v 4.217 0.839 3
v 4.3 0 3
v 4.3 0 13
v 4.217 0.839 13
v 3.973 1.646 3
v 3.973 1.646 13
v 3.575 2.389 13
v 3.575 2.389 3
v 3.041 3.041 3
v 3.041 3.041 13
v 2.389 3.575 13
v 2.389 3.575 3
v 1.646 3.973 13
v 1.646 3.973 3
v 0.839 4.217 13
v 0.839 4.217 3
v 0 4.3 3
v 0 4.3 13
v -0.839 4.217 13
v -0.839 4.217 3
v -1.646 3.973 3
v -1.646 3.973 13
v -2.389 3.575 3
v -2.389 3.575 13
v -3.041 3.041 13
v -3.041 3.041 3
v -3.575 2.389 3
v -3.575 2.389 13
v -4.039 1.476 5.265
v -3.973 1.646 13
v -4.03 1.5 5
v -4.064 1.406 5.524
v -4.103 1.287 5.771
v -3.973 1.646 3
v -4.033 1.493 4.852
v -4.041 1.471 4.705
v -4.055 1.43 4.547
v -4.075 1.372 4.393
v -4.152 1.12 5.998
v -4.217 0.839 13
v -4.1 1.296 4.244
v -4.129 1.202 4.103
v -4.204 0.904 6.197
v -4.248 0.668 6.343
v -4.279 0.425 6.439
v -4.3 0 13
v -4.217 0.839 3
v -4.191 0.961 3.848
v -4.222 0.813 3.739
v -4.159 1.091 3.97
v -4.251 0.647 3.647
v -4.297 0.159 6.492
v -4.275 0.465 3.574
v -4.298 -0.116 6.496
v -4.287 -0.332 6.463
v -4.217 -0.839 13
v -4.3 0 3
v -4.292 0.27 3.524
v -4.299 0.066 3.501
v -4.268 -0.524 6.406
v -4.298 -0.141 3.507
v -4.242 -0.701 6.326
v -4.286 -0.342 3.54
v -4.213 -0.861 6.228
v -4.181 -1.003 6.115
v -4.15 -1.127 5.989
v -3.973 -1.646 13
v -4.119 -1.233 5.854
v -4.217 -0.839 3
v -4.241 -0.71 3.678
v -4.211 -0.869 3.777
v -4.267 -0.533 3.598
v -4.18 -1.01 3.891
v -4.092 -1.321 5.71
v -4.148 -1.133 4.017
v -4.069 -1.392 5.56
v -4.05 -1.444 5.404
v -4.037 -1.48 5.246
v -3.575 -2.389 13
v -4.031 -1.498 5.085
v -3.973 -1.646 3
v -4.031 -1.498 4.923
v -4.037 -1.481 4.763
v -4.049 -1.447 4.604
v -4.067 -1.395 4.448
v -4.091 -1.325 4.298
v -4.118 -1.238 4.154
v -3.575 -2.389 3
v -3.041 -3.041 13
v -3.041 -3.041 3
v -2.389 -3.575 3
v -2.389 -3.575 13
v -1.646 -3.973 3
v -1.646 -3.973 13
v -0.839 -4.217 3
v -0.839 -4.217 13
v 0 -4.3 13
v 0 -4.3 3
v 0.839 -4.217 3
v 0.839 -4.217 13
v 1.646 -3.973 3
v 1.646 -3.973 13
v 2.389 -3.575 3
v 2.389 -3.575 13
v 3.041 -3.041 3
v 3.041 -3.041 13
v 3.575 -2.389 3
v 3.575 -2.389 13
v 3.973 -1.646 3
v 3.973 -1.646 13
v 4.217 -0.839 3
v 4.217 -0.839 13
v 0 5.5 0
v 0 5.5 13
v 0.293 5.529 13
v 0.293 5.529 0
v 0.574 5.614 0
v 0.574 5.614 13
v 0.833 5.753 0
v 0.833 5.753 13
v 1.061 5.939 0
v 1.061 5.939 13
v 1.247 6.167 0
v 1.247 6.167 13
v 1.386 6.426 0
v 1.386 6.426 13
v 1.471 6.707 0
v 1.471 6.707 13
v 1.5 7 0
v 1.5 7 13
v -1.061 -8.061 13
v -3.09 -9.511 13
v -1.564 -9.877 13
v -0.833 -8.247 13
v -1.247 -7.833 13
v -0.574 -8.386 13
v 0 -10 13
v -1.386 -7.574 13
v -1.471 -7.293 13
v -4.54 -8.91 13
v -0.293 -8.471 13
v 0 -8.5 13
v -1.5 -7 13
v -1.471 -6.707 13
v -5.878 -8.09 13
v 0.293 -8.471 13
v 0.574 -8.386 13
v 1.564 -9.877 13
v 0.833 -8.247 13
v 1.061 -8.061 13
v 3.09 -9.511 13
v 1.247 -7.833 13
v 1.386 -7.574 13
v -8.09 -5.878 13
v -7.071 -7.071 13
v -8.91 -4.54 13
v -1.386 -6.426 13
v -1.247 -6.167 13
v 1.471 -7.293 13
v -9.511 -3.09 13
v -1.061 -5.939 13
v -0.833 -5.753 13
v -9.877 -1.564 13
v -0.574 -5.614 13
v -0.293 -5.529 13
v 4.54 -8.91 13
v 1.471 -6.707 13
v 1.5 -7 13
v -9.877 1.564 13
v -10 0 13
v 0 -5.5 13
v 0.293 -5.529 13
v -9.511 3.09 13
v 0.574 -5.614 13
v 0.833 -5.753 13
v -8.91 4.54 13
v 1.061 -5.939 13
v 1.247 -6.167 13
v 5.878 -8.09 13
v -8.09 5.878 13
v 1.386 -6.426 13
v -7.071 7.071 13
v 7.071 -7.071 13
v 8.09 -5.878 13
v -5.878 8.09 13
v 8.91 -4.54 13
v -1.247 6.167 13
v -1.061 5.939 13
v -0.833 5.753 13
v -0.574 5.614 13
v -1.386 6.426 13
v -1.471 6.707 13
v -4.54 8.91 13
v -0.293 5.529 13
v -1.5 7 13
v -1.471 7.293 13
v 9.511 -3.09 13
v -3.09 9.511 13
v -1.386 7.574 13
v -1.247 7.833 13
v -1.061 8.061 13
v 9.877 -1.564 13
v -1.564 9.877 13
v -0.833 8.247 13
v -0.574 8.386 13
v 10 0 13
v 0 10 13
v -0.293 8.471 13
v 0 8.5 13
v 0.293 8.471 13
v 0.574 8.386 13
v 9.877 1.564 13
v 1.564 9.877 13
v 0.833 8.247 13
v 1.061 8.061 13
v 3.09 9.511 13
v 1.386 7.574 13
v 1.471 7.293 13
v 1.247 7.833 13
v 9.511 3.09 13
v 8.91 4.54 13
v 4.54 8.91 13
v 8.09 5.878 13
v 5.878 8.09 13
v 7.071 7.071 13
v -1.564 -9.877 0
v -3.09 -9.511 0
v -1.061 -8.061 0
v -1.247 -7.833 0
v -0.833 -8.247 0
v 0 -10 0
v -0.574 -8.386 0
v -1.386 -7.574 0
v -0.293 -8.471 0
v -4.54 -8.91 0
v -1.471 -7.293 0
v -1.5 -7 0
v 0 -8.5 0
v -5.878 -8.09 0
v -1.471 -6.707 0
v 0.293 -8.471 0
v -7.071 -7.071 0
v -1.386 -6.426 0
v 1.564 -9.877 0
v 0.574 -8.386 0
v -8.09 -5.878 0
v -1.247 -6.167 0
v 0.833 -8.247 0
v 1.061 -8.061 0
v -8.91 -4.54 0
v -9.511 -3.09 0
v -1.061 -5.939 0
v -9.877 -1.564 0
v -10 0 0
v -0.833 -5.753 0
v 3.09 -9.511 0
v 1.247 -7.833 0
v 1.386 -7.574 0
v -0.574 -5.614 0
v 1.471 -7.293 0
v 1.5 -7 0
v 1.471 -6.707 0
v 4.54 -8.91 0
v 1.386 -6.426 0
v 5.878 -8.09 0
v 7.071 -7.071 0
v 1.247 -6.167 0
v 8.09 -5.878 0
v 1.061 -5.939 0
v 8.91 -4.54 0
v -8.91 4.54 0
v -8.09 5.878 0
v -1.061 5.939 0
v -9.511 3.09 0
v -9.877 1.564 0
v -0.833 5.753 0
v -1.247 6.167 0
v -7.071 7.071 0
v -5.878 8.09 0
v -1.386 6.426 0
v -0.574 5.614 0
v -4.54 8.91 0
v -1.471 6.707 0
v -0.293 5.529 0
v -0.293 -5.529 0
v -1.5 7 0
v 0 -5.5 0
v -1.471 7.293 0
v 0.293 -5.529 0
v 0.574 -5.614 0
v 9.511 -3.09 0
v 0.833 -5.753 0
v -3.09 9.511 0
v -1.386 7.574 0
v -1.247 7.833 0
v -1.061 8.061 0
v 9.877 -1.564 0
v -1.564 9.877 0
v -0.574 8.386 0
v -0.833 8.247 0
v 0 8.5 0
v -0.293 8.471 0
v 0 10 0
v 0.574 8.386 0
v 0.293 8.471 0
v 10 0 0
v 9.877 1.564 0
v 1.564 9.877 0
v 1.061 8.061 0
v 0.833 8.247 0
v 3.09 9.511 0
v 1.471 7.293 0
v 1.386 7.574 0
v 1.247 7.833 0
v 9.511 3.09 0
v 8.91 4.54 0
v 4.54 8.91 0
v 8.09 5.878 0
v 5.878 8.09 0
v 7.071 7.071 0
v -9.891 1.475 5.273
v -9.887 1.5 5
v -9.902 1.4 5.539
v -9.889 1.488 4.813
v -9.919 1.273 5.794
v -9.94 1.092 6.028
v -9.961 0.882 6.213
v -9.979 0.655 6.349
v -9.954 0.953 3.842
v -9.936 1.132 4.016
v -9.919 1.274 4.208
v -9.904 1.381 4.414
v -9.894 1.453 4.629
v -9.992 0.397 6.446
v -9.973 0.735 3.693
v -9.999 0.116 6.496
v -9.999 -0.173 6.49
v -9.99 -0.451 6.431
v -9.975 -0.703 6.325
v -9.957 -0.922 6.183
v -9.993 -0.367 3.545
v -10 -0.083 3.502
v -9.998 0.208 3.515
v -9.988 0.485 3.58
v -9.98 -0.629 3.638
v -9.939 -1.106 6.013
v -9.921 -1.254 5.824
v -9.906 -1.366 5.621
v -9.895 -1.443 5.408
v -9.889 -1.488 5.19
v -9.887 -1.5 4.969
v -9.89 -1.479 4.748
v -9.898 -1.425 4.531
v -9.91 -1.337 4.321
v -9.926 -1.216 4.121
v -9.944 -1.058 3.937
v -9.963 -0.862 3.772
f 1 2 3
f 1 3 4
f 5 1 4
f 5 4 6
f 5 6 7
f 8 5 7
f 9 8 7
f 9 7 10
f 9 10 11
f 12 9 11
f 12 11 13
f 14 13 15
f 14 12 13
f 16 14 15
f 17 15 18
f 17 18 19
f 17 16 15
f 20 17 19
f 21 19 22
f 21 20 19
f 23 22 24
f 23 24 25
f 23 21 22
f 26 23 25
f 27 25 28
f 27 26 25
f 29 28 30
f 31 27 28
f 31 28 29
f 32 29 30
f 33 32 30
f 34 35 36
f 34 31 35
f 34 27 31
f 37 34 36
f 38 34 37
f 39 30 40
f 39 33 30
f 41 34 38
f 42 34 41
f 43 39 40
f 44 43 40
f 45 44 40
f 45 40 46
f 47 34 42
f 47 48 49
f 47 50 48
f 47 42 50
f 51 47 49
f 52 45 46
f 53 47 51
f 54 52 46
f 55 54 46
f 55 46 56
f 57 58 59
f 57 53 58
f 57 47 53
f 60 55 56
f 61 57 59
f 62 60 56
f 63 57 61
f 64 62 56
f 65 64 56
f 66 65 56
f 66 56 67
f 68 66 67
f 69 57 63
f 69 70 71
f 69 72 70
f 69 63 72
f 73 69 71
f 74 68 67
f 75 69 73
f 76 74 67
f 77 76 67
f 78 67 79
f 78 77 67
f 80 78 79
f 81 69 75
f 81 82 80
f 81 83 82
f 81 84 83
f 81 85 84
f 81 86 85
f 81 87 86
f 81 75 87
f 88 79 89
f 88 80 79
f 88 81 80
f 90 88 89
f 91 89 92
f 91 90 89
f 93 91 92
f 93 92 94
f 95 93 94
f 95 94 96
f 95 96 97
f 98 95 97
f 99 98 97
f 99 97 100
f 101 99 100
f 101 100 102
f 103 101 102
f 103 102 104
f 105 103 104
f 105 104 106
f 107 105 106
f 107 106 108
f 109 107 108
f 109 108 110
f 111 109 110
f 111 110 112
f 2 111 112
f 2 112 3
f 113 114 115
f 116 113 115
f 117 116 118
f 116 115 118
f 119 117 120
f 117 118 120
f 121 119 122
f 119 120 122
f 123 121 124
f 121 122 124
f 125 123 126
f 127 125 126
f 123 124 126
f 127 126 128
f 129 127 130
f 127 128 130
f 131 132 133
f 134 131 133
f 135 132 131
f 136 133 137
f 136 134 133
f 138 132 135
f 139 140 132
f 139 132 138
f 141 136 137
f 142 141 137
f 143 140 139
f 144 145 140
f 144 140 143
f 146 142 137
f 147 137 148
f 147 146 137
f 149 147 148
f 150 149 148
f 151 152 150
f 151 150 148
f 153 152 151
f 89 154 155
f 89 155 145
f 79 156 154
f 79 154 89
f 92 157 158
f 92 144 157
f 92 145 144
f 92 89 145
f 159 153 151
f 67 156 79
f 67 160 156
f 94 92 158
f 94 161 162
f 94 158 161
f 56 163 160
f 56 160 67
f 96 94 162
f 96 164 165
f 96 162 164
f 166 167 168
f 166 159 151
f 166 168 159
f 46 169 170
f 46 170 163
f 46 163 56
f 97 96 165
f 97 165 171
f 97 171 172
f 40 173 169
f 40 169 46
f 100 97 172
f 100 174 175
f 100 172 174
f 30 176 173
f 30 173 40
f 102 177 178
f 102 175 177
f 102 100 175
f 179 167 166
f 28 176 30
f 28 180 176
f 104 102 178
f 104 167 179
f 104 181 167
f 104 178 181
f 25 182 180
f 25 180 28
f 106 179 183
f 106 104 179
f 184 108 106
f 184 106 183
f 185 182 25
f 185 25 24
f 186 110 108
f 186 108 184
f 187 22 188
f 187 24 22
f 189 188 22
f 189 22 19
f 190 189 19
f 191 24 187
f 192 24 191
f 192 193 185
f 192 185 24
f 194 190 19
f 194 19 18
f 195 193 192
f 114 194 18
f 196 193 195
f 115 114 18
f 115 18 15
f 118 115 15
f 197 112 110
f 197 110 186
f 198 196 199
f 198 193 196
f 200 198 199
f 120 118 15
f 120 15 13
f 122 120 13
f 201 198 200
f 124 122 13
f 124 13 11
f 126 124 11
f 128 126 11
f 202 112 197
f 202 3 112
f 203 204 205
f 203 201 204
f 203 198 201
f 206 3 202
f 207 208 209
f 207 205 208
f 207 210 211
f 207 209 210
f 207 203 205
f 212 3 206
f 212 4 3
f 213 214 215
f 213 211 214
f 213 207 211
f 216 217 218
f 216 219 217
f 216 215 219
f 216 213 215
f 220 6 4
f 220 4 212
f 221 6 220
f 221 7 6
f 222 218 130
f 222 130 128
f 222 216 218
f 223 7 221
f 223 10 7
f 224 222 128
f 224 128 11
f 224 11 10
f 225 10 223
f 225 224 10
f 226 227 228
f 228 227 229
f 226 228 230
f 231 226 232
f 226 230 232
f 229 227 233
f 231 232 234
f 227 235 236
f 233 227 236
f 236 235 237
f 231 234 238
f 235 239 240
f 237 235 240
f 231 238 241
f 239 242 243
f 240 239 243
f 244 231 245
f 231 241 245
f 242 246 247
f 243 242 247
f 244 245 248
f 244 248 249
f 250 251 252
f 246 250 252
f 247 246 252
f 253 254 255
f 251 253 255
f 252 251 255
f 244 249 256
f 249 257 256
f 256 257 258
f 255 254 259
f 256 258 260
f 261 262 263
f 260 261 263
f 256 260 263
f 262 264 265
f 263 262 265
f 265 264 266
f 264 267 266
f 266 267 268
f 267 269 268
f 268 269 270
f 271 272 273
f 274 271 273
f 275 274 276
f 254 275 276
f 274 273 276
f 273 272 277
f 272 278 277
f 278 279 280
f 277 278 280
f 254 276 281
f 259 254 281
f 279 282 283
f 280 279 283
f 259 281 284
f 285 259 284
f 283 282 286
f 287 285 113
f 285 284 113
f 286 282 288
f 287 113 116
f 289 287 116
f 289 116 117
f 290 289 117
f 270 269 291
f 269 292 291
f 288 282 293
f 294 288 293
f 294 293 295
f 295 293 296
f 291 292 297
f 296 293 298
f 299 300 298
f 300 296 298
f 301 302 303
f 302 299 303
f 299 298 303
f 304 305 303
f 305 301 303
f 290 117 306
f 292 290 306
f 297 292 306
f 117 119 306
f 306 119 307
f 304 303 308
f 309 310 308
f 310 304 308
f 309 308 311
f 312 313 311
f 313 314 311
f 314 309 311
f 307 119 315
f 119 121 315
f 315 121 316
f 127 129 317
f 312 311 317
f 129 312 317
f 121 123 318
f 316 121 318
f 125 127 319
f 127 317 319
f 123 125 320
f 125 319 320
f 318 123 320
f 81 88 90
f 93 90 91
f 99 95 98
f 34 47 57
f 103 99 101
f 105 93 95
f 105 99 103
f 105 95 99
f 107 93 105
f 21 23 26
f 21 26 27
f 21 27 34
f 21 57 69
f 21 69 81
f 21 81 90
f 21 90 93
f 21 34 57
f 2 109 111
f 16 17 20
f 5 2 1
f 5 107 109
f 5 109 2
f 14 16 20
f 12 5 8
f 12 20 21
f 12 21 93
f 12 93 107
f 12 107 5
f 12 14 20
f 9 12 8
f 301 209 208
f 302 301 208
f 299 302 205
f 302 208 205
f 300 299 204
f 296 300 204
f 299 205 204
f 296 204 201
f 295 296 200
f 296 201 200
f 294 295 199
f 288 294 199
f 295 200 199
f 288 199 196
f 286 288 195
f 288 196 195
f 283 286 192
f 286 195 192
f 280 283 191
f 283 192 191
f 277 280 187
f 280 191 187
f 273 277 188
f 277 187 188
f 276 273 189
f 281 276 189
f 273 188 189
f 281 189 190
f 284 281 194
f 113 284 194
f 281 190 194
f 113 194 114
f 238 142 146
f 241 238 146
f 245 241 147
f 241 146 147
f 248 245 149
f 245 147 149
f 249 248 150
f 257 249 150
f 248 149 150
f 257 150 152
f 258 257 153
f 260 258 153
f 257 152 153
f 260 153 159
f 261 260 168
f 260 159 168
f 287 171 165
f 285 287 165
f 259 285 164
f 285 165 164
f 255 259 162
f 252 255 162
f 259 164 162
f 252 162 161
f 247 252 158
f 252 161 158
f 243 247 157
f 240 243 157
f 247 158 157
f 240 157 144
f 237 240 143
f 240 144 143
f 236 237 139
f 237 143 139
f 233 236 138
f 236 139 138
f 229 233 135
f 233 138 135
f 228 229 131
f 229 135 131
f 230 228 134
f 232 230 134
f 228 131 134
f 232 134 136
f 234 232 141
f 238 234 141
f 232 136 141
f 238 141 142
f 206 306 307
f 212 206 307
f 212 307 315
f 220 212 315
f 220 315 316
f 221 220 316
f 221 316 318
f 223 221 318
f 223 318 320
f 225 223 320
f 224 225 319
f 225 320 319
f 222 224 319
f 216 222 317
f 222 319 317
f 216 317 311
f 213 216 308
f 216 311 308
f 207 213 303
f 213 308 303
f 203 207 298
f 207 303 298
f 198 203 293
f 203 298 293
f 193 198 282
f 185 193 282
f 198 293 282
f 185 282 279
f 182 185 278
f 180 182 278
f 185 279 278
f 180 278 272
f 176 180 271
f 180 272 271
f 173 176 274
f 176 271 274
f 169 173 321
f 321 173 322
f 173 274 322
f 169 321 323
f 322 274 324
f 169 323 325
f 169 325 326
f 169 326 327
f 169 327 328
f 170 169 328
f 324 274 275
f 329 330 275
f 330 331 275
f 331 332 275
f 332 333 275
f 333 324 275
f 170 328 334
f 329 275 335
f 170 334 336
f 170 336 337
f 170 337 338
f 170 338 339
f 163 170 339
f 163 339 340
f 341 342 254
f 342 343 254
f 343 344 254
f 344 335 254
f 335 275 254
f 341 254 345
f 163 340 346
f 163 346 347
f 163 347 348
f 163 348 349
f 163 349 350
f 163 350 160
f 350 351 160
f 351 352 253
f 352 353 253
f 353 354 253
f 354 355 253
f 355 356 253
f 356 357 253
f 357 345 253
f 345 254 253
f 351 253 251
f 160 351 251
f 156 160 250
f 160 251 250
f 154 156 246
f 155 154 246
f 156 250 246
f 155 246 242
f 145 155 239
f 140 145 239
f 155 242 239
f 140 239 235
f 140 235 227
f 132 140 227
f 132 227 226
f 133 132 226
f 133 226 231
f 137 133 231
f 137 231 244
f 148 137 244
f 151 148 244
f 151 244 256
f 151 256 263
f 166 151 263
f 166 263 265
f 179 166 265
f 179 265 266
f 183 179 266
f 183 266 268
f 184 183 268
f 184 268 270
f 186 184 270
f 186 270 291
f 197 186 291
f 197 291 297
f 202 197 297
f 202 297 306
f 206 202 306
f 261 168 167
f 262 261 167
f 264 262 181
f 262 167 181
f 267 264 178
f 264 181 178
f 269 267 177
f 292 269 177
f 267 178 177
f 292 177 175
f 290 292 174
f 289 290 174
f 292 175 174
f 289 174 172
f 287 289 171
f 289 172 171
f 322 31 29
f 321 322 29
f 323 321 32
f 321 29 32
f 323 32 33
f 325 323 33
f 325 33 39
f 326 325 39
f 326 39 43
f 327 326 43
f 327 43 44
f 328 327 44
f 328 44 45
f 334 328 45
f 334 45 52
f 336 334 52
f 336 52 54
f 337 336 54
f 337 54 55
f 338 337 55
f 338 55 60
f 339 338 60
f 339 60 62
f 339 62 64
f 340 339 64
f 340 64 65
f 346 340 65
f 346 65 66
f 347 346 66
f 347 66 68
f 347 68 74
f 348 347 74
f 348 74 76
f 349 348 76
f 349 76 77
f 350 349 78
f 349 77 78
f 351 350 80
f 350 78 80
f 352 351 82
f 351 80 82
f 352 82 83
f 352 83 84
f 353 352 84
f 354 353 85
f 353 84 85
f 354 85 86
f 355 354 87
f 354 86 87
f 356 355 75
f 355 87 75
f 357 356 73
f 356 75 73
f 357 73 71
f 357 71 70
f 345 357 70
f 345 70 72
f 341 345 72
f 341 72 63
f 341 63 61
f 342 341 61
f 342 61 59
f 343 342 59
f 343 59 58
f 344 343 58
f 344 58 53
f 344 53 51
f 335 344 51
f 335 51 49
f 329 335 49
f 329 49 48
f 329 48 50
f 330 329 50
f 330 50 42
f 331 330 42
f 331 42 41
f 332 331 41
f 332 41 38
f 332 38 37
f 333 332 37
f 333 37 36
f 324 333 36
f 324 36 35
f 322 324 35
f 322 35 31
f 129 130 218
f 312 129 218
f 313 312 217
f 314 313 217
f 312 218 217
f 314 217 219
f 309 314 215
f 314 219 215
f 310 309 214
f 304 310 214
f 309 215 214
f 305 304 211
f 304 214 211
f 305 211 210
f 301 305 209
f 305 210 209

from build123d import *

# Parameters (mm, degrees)
F0_R     = 10
F0_R_2   = 4.3
F1_DEPTH = 13
F2_R     = 4.3
F3_DEPTH = 3
F6_DEPTH = 25.4
F7_R     = 1.5
F8_DEPTH = 25.4


with BuildPart() as f1:
    # F0 (on Top) → F1 (new body)
    with BuildSketch(Plane.XY):
        Circle(F0_R)
        Circle(F0_R_2, mode=Mode.SUBTRACT)
    extrude(amount=F1_DEPTH)

    # F2 (on Top) → F3 (join)
    with BuildSketch(Plane.XY):
        Circle(F2_R)
    extrude(amount=F3_DEPTH)

    # F5 (on offset) → F6 (cut)
    with BuildSketch(Plane.XY.offset(13)):
        with BuildLine():
            ThreePointArc((0, -5.5), (-1.5, -7), (0, -8.5))
            Line((0, -8.5), (0, -5.5))
        make_face()
        with BuildLine():
            ThreePointArc((0, 8.5), (-1.5, 7), (0, 5.5))
            Line((0, 5.5), (0, 8.5))
        make_face()
        with BuildLine():
            Line((0, 8.5), (0, 5.5))
            ThreePointArc((0, 5.5), (1.06066, 5.93934), (1.5, 7))
            ThreePointArc((1.5, 7), (1.06066, 8.06066), (0, 8.5))
        make_face()
        with BuildLine():
            Line((0, -5.5), (0, -8.5))
            ThreePointArc((0, -8.5), (1.06066, -8.06066), (1.5, -7))
            ThreePointArc((1.5, -7), (1.06066, -5.93934), (0, -5.5))
        make_face()
    extrude(amount=-F6_DEPTH, mode=Mode.SUBTRACT)

    # F7 (on Right) → F8 (cut)
    with BuildSketch(Plane.YZ):
        with Locations((0, 5)):
            Circle(F7_R)
    extrude(amount=-F8_DEPTH, mode=Mode.SUBTRACT)


solid = f1.part
